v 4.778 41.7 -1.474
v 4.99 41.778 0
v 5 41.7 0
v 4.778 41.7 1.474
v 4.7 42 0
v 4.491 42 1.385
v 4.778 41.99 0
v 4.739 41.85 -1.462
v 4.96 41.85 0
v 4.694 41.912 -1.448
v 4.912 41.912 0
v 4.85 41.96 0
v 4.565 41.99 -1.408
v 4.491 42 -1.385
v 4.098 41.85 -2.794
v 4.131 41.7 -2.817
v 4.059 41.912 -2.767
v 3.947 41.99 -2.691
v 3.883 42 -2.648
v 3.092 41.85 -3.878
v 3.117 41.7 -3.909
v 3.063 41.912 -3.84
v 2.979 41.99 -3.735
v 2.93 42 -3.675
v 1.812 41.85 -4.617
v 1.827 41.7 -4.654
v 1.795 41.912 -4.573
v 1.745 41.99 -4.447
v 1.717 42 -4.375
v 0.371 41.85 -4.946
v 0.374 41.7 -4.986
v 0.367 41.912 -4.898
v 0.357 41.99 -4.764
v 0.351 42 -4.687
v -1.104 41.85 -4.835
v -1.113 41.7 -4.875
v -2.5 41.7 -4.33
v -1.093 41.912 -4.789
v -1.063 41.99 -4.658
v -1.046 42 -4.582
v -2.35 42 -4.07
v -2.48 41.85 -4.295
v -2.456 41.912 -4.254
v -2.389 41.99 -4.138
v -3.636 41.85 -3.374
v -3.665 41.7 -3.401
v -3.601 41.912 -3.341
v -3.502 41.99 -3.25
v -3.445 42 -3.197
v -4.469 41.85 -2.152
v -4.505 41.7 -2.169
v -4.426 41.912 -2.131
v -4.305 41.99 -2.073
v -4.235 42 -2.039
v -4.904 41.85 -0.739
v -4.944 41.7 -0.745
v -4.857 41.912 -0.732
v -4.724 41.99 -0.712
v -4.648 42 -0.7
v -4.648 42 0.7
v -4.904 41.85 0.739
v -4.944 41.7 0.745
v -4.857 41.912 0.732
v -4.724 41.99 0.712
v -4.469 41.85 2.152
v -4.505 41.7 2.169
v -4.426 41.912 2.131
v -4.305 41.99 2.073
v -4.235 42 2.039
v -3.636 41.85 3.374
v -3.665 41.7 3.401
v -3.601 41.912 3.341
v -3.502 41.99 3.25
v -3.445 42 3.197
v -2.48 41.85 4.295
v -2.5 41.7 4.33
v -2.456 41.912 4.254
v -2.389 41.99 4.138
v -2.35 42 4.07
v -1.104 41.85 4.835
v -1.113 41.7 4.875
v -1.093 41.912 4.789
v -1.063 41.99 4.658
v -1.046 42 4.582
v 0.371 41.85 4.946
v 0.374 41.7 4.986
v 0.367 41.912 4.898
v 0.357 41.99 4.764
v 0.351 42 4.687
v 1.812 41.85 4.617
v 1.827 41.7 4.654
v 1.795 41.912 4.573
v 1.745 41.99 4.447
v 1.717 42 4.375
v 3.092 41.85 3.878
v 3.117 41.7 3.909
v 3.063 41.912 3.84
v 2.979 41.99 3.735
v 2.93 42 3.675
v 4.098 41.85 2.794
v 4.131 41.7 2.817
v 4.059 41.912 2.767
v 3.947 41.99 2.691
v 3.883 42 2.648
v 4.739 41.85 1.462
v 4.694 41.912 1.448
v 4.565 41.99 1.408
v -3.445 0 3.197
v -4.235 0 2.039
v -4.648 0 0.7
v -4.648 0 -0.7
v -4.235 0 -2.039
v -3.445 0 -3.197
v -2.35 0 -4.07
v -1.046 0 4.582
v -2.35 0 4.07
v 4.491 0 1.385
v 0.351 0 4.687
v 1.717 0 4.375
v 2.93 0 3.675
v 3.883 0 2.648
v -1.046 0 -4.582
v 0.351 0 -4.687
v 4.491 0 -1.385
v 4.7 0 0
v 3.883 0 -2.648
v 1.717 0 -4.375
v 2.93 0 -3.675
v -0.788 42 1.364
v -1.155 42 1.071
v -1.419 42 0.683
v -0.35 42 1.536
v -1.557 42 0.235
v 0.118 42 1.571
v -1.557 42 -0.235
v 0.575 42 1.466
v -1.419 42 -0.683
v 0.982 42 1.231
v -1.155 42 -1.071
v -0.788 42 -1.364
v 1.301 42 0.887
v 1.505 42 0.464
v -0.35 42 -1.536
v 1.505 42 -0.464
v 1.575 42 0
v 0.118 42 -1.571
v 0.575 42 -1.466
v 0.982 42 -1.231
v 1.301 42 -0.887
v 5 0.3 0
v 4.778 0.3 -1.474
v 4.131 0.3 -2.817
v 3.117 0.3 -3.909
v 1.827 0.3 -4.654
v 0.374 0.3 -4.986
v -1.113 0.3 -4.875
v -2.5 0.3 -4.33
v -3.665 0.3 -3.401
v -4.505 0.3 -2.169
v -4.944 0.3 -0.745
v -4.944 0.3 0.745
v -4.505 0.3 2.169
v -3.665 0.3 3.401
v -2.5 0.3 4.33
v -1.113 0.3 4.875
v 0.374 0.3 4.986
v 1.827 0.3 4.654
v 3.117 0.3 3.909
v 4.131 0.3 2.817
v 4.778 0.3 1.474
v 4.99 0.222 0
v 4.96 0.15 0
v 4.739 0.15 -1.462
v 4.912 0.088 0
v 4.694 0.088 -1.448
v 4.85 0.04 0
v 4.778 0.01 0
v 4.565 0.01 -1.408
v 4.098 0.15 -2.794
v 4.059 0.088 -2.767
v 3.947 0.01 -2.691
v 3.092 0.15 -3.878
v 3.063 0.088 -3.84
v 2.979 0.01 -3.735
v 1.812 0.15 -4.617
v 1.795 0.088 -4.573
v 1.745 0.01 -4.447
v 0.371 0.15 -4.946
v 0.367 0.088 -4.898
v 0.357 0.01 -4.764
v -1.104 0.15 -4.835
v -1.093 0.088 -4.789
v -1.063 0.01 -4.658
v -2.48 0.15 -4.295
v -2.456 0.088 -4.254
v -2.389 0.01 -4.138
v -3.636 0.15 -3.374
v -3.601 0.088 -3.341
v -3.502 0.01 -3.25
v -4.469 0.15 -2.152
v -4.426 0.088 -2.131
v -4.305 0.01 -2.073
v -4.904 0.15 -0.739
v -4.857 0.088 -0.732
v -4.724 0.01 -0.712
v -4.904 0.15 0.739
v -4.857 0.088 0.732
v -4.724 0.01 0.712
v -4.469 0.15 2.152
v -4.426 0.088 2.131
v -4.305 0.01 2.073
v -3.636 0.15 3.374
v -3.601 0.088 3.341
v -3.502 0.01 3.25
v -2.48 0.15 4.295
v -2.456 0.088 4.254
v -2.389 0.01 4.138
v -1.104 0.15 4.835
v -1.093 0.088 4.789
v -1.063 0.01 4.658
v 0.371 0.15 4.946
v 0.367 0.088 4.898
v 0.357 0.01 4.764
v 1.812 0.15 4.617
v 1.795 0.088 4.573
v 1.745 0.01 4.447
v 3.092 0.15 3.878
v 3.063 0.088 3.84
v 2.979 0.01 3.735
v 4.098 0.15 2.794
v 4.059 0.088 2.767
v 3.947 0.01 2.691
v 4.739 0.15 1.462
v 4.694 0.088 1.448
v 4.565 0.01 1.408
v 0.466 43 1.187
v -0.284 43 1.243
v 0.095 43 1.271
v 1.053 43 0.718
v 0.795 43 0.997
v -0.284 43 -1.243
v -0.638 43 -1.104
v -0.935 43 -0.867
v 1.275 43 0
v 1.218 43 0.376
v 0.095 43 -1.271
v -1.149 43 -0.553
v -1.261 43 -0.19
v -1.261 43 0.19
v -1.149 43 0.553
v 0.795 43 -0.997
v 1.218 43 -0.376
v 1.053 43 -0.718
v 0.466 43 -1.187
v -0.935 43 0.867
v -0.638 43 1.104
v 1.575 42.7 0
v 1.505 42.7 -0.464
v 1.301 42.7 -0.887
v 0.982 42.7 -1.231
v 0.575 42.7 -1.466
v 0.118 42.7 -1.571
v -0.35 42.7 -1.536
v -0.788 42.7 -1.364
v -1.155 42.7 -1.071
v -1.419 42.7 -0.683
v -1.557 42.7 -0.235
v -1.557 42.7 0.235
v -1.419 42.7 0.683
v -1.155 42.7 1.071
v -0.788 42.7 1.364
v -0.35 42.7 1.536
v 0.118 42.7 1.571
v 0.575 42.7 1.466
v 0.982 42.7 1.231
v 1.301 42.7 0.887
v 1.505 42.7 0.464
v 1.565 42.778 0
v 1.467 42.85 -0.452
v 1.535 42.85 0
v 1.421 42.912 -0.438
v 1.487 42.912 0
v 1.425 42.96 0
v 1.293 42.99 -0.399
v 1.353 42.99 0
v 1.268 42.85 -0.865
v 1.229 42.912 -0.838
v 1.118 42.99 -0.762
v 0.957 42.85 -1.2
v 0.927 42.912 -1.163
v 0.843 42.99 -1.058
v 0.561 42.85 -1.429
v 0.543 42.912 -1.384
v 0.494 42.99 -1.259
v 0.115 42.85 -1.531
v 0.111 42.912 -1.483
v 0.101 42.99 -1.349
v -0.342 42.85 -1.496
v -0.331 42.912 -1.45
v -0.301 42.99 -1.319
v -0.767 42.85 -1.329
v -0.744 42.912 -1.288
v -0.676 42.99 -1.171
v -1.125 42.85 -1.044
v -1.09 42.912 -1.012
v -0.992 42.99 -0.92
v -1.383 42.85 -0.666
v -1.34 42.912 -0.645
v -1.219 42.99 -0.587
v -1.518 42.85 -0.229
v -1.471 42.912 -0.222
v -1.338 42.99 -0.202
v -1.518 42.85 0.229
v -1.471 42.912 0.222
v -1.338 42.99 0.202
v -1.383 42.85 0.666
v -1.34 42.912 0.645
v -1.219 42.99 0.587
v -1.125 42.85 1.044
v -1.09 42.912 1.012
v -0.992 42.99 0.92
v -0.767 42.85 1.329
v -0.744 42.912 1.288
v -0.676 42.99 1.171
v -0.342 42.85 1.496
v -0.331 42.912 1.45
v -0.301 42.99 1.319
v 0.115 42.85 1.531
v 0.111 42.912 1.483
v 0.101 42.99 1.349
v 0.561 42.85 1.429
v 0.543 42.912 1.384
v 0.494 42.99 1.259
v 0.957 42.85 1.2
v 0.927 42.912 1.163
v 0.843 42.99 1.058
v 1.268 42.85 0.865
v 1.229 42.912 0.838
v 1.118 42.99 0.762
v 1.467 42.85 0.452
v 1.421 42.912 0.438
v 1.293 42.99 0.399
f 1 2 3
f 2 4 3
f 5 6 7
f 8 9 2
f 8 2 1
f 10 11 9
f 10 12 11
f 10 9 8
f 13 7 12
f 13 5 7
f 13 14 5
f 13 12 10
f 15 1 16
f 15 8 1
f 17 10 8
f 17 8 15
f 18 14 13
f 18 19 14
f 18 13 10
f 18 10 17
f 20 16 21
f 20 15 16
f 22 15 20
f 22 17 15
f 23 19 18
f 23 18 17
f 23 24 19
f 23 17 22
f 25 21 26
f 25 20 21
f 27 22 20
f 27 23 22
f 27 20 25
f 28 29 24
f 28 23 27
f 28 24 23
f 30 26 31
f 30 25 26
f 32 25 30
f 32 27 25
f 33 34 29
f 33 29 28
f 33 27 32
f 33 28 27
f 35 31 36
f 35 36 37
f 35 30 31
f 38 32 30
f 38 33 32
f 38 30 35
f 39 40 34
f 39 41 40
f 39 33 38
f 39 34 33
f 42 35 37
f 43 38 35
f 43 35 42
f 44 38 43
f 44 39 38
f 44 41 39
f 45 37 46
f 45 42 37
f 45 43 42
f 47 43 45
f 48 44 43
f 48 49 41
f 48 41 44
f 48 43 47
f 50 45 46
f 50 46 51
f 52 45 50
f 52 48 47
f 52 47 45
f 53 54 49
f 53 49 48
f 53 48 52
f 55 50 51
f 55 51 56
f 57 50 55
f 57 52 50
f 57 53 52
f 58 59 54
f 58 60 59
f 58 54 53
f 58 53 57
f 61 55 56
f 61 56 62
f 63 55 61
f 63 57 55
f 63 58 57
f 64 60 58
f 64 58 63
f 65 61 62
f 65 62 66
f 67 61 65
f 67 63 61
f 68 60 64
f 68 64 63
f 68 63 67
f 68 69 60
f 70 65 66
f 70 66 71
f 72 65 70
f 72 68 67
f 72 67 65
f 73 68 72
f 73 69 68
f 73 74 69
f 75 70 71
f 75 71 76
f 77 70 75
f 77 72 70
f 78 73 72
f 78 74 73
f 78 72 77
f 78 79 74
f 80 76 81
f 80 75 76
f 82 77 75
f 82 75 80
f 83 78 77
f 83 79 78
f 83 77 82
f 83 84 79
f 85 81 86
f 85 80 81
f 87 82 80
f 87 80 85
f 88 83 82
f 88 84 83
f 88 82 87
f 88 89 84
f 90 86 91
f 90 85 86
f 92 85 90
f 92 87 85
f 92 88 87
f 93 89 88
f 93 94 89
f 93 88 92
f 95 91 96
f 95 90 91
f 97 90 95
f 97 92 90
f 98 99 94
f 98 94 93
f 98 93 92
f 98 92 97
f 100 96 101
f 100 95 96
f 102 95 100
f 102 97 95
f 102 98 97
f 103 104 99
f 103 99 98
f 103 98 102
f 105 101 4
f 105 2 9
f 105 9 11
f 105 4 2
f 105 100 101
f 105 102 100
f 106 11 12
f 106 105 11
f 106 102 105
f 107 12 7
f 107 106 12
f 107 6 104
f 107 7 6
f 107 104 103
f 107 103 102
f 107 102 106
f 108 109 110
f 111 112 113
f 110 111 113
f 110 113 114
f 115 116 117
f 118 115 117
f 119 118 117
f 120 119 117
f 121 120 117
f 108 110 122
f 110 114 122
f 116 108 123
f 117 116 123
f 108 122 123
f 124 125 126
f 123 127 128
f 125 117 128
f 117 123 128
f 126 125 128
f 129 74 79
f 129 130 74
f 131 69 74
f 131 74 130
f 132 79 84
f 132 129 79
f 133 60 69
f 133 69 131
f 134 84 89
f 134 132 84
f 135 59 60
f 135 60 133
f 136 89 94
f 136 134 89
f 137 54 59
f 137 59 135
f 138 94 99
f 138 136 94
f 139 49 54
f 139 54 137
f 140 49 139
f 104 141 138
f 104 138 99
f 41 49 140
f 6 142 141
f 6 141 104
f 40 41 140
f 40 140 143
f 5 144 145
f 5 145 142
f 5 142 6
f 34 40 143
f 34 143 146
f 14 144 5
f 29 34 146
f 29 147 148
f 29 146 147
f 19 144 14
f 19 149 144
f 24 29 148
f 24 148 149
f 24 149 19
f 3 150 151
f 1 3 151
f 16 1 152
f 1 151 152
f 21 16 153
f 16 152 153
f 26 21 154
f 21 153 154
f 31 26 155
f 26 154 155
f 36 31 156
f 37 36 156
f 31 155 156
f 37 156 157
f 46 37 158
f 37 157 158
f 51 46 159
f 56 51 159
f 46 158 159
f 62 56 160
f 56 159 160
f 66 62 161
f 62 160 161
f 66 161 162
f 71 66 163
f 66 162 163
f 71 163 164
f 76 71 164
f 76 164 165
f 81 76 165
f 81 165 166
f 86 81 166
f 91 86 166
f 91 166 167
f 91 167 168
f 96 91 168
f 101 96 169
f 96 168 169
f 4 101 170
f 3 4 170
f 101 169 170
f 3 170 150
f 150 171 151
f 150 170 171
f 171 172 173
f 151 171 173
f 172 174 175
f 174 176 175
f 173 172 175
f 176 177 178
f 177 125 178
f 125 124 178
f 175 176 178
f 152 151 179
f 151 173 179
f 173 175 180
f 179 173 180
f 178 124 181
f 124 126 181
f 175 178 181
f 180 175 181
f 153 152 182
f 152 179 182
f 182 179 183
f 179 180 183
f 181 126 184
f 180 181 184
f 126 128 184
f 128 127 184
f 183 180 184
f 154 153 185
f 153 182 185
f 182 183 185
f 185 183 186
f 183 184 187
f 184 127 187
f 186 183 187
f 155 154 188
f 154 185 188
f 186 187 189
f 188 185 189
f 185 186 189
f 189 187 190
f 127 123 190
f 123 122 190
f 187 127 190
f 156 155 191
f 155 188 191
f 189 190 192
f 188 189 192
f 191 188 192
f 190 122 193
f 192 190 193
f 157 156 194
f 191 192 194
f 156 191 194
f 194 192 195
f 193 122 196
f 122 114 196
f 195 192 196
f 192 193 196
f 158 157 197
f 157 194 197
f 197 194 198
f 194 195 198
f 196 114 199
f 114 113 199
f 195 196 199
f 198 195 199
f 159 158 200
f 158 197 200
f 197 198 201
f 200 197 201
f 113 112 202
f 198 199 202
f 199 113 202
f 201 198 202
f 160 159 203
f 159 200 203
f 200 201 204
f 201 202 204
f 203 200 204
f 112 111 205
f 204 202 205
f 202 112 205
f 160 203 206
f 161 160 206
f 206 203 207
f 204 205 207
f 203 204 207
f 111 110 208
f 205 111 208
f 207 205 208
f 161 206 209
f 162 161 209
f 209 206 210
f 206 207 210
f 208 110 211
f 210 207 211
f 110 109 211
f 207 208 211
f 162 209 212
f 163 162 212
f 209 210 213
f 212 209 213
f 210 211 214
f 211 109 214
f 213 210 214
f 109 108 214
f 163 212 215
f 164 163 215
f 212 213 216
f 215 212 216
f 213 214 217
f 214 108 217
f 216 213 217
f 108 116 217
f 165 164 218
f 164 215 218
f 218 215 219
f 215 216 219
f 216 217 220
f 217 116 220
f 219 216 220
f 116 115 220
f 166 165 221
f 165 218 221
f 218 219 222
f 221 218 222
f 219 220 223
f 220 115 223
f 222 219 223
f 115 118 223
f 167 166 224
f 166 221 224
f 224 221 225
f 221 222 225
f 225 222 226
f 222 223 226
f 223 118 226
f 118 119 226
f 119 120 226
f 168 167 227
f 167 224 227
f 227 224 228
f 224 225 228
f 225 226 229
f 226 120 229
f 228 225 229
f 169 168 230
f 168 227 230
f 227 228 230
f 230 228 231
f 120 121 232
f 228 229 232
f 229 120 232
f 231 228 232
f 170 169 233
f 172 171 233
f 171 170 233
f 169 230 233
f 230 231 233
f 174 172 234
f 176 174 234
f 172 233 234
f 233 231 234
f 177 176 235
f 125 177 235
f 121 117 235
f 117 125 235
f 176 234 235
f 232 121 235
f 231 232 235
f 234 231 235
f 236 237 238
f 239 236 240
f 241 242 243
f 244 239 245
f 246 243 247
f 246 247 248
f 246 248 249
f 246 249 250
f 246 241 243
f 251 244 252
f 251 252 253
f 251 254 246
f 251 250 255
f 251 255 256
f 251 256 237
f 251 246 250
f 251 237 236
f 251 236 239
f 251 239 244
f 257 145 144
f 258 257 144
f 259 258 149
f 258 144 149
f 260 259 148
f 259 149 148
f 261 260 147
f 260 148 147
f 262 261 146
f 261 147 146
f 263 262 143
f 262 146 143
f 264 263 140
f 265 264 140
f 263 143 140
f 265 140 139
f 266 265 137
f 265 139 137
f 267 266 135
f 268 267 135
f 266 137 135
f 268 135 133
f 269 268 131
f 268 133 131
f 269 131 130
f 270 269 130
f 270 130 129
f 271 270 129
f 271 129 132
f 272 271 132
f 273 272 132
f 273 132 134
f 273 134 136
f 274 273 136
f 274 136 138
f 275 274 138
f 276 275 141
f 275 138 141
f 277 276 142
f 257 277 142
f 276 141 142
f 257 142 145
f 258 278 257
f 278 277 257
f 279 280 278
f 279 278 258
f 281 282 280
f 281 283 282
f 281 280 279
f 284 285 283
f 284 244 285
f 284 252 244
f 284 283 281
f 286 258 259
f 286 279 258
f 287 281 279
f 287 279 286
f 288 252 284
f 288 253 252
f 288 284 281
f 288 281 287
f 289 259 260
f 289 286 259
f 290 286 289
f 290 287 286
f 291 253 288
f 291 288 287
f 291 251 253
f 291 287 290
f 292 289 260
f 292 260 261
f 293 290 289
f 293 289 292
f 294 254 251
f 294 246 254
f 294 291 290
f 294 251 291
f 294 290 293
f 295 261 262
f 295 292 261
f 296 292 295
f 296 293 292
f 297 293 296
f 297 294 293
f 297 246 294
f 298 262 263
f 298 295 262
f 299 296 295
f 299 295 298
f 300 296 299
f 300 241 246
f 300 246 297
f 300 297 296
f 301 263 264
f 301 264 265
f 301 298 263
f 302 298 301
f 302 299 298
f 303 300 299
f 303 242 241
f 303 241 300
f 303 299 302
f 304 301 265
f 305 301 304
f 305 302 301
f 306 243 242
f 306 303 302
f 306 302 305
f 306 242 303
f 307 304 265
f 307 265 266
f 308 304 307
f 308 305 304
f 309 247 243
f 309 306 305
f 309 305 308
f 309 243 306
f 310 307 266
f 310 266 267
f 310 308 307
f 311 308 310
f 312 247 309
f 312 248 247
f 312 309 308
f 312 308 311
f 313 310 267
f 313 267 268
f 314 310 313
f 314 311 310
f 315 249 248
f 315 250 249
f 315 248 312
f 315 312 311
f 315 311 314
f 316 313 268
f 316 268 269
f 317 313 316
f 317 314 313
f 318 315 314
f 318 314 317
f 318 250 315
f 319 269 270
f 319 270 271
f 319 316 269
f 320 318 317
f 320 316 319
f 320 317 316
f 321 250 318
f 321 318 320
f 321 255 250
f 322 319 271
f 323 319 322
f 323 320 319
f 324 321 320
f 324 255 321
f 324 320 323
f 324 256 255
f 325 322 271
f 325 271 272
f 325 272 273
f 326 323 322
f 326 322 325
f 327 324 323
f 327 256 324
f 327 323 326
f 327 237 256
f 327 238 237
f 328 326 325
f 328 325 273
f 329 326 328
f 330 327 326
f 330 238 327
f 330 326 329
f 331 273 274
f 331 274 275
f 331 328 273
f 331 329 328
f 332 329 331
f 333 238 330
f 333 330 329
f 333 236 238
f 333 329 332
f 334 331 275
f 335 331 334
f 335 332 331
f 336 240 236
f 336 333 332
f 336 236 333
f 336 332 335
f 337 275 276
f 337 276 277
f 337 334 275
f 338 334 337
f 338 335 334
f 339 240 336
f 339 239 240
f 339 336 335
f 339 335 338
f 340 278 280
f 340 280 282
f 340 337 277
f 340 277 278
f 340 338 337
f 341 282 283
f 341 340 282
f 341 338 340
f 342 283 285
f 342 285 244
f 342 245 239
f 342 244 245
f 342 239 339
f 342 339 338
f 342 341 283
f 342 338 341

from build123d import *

# Parameters (mm, degrees)
SKETCH1_R           = 5
BOSS_EXTRUDE1_DEPTH = 42
SKETCH2_R           = 1.575
BOSS_EXTRUDE2_DEPTH = 1
FILLET1_R           = 0.3


with BuildPart() as part:
    # Sketch1 → Boss-Extrude1 (new body)
    with BuildSketch(Plane(origin=(0, 0, 0), x_dir=(1, 0, 0), z_dir=(0, 1, 0))):
        Circle(SKETCH1_R)
    extrude(amount=BOSS_EXTRUDE1_DEPTH)

    # Sketch2 → Boss-Extrude2 (add)
    with BuildSketch(Plane(origin=(0, 42, 0), x_dir=(1, 0, 0), z_dir=(0, 1, 0))):
        Circle(SKETCH2_R)
    extrude(amount=BOSS_EXTRUDE2_DEPTH)

    # Fillet1
    fillet1_edges = [part.edges().sort_by_distance(p)[0] for p in [
        (-5, 0, 0),
        (-5, 42, 0),
        (-1.575, 43, 0),
    ]]
    fillet(fillet1_edges, radius=FILLET1_R)


solid = part.part
